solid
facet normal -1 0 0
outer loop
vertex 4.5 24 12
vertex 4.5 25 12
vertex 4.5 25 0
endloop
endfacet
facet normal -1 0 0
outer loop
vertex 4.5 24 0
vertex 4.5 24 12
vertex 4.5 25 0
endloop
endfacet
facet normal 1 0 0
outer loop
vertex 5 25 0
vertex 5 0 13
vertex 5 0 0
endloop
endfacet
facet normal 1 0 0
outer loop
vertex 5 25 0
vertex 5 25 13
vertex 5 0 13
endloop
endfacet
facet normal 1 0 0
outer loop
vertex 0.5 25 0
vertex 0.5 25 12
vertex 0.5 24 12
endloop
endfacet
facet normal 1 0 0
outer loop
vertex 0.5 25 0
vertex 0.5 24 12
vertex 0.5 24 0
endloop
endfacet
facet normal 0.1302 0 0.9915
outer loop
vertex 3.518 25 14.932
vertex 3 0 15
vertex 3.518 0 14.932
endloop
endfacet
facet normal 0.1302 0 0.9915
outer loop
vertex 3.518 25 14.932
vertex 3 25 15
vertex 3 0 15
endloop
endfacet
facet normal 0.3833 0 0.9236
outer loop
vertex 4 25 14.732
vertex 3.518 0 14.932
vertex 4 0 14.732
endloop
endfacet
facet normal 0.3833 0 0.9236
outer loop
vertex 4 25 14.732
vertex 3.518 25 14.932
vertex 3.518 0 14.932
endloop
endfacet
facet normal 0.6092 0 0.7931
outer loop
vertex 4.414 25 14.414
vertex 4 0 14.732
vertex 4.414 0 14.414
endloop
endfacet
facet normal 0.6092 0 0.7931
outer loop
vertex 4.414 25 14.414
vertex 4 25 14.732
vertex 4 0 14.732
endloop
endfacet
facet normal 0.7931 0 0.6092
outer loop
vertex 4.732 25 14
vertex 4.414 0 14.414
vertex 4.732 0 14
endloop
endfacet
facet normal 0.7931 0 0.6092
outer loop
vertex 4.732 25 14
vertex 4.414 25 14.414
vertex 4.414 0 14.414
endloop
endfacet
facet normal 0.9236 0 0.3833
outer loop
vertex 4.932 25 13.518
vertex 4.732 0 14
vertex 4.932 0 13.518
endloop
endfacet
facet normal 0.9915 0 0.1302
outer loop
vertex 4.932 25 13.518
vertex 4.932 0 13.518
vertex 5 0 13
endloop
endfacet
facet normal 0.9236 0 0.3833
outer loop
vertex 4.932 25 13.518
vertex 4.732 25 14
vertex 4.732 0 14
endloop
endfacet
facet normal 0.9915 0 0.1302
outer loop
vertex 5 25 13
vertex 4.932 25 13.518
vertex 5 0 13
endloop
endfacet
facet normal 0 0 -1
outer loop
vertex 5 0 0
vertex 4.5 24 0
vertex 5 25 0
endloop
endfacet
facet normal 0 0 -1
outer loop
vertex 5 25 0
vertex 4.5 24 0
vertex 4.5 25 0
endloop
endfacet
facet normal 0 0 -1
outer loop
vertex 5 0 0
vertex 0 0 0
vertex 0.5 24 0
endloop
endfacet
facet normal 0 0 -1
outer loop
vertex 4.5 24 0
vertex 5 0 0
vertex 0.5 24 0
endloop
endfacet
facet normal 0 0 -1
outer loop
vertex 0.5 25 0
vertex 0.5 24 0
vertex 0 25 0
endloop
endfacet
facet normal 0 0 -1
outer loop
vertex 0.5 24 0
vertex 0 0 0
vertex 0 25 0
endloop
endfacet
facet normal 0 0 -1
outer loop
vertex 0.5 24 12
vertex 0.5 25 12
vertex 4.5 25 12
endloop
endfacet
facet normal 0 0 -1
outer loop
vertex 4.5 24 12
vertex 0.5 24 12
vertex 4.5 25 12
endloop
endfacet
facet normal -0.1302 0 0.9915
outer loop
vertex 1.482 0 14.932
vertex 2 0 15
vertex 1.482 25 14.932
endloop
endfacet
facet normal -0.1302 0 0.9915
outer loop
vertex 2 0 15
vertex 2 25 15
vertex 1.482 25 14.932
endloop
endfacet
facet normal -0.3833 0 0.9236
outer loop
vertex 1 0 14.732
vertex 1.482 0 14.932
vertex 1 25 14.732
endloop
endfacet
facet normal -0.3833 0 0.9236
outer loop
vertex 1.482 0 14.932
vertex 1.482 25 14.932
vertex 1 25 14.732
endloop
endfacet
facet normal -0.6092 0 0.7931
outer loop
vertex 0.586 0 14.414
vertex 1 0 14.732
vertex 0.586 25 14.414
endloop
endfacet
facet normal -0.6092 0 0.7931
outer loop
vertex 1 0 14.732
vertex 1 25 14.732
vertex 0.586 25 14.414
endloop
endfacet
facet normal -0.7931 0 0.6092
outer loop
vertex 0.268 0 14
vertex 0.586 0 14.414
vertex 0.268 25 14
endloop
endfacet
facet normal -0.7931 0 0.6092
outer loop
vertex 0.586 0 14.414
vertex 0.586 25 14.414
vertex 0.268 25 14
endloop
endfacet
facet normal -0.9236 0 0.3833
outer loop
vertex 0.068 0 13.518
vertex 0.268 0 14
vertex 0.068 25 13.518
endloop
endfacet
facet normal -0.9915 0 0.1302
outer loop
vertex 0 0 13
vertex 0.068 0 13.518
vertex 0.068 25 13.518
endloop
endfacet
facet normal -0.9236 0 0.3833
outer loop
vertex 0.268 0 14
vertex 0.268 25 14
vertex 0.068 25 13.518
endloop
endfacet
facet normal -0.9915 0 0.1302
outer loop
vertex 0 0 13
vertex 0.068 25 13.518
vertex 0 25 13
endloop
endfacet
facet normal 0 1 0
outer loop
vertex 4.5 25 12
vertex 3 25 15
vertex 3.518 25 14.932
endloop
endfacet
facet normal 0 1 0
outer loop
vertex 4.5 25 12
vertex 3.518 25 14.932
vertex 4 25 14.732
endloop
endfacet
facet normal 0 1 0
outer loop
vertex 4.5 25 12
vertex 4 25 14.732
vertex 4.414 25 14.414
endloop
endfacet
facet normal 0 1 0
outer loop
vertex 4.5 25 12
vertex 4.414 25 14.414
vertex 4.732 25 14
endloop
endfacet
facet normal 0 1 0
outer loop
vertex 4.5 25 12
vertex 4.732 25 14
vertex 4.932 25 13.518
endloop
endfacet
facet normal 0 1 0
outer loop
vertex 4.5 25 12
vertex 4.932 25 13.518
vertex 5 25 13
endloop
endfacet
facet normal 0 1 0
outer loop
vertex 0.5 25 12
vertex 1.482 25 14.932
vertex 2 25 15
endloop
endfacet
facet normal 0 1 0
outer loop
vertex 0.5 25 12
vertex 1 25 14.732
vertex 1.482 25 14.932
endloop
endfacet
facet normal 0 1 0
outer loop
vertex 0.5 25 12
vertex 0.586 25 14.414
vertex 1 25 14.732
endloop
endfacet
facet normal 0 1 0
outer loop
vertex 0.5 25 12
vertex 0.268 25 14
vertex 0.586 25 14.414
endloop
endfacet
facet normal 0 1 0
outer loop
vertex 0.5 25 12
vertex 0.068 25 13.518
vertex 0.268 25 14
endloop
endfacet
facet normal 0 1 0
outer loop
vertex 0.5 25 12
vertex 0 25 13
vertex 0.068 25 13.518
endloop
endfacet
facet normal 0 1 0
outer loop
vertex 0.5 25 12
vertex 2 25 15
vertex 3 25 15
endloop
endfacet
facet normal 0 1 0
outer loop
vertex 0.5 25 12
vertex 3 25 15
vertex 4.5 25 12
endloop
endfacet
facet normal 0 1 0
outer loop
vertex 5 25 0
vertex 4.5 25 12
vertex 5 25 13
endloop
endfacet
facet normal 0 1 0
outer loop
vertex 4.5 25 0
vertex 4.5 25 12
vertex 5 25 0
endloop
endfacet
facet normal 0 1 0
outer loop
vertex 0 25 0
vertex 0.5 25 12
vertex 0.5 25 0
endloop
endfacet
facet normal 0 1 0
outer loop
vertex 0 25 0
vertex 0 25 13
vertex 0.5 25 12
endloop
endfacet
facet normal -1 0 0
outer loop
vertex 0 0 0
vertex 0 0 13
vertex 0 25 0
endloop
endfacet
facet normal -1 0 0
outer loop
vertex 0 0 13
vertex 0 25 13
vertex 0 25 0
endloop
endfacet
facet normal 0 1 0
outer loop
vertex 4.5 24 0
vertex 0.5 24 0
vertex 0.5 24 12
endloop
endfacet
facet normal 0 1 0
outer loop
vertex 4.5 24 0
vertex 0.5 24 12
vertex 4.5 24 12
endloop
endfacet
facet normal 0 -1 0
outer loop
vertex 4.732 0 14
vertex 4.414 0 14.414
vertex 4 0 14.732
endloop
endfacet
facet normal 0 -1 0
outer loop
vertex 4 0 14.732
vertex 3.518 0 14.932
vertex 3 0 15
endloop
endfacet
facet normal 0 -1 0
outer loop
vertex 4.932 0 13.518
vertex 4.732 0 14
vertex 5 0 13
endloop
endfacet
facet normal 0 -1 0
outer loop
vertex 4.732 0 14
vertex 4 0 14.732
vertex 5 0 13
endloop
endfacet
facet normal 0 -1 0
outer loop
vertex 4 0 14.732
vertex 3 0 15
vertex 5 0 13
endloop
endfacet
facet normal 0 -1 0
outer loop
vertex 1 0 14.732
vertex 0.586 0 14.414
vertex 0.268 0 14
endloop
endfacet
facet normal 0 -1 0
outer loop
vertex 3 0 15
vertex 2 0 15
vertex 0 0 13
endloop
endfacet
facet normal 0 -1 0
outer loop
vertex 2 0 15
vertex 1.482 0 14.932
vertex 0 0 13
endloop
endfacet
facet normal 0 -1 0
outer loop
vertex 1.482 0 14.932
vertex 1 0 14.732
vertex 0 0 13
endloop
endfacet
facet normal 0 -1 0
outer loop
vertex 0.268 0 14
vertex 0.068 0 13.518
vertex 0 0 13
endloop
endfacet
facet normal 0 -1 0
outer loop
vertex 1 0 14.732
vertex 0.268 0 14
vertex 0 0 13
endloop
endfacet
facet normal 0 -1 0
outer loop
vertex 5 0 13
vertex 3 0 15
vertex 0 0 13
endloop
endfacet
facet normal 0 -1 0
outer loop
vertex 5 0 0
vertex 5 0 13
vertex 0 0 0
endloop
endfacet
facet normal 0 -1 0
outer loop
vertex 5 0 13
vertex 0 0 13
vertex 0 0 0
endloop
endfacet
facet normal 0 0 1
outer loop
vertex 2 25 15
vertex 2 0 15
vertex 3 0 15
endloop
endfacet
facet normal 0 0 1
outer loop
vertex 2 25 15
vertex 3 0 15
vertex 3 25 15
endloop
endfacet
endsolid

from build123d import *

# Parameters (mm, degrees)
SKETCH1_W           = 15
SKETCH1_H           = 25
BOSS_EXTRUDE1_DEPTH = 5
FILLET1_R           = 2
SKETCH2_W           = 4
SKETCH2_H           = 12
CUT_EXTRUDE1_DEPTH  = 1


with BuildPart() as part:
    # Sketch1 → Boss-Extrude1 (new body)
    with BuildSketch(Plane(origin=(0, 0, 0), x_dir=(0, 0, -1), z_dir=(1, 0, 0))):
        with Locations((-7.5, 12.5)):
            Rectangle(SKETCH1_W, SKETCH1_H)
    extrude(amount=BOSS_EXTRUDE1_DEPTH)

    # Fillet1
    fillet1_edges = [part.edges().sort_by_distance(p)[0] for p in [
        (5, 12.5, 15),
        (0, 12.5, 15),
    ]]
    fillet(fillet1_edges, radius=FILLET1_R)

    # Sketch2 → Cut-Extrude1 (cut)
    with BuildSketch(Plane(origin=(0, 25, 0), x_dir=(1, 0, 0), z_dir=(0, 1, 0))):
        with Locations((2.5, -6)):
            Rectangle(SKETCH2_W, SKETCH2_H)
    extrude(amount=-CUT_EXTRUDE1_DEPTH, mode=Mode.SUBTRACT)


solid = part.part
